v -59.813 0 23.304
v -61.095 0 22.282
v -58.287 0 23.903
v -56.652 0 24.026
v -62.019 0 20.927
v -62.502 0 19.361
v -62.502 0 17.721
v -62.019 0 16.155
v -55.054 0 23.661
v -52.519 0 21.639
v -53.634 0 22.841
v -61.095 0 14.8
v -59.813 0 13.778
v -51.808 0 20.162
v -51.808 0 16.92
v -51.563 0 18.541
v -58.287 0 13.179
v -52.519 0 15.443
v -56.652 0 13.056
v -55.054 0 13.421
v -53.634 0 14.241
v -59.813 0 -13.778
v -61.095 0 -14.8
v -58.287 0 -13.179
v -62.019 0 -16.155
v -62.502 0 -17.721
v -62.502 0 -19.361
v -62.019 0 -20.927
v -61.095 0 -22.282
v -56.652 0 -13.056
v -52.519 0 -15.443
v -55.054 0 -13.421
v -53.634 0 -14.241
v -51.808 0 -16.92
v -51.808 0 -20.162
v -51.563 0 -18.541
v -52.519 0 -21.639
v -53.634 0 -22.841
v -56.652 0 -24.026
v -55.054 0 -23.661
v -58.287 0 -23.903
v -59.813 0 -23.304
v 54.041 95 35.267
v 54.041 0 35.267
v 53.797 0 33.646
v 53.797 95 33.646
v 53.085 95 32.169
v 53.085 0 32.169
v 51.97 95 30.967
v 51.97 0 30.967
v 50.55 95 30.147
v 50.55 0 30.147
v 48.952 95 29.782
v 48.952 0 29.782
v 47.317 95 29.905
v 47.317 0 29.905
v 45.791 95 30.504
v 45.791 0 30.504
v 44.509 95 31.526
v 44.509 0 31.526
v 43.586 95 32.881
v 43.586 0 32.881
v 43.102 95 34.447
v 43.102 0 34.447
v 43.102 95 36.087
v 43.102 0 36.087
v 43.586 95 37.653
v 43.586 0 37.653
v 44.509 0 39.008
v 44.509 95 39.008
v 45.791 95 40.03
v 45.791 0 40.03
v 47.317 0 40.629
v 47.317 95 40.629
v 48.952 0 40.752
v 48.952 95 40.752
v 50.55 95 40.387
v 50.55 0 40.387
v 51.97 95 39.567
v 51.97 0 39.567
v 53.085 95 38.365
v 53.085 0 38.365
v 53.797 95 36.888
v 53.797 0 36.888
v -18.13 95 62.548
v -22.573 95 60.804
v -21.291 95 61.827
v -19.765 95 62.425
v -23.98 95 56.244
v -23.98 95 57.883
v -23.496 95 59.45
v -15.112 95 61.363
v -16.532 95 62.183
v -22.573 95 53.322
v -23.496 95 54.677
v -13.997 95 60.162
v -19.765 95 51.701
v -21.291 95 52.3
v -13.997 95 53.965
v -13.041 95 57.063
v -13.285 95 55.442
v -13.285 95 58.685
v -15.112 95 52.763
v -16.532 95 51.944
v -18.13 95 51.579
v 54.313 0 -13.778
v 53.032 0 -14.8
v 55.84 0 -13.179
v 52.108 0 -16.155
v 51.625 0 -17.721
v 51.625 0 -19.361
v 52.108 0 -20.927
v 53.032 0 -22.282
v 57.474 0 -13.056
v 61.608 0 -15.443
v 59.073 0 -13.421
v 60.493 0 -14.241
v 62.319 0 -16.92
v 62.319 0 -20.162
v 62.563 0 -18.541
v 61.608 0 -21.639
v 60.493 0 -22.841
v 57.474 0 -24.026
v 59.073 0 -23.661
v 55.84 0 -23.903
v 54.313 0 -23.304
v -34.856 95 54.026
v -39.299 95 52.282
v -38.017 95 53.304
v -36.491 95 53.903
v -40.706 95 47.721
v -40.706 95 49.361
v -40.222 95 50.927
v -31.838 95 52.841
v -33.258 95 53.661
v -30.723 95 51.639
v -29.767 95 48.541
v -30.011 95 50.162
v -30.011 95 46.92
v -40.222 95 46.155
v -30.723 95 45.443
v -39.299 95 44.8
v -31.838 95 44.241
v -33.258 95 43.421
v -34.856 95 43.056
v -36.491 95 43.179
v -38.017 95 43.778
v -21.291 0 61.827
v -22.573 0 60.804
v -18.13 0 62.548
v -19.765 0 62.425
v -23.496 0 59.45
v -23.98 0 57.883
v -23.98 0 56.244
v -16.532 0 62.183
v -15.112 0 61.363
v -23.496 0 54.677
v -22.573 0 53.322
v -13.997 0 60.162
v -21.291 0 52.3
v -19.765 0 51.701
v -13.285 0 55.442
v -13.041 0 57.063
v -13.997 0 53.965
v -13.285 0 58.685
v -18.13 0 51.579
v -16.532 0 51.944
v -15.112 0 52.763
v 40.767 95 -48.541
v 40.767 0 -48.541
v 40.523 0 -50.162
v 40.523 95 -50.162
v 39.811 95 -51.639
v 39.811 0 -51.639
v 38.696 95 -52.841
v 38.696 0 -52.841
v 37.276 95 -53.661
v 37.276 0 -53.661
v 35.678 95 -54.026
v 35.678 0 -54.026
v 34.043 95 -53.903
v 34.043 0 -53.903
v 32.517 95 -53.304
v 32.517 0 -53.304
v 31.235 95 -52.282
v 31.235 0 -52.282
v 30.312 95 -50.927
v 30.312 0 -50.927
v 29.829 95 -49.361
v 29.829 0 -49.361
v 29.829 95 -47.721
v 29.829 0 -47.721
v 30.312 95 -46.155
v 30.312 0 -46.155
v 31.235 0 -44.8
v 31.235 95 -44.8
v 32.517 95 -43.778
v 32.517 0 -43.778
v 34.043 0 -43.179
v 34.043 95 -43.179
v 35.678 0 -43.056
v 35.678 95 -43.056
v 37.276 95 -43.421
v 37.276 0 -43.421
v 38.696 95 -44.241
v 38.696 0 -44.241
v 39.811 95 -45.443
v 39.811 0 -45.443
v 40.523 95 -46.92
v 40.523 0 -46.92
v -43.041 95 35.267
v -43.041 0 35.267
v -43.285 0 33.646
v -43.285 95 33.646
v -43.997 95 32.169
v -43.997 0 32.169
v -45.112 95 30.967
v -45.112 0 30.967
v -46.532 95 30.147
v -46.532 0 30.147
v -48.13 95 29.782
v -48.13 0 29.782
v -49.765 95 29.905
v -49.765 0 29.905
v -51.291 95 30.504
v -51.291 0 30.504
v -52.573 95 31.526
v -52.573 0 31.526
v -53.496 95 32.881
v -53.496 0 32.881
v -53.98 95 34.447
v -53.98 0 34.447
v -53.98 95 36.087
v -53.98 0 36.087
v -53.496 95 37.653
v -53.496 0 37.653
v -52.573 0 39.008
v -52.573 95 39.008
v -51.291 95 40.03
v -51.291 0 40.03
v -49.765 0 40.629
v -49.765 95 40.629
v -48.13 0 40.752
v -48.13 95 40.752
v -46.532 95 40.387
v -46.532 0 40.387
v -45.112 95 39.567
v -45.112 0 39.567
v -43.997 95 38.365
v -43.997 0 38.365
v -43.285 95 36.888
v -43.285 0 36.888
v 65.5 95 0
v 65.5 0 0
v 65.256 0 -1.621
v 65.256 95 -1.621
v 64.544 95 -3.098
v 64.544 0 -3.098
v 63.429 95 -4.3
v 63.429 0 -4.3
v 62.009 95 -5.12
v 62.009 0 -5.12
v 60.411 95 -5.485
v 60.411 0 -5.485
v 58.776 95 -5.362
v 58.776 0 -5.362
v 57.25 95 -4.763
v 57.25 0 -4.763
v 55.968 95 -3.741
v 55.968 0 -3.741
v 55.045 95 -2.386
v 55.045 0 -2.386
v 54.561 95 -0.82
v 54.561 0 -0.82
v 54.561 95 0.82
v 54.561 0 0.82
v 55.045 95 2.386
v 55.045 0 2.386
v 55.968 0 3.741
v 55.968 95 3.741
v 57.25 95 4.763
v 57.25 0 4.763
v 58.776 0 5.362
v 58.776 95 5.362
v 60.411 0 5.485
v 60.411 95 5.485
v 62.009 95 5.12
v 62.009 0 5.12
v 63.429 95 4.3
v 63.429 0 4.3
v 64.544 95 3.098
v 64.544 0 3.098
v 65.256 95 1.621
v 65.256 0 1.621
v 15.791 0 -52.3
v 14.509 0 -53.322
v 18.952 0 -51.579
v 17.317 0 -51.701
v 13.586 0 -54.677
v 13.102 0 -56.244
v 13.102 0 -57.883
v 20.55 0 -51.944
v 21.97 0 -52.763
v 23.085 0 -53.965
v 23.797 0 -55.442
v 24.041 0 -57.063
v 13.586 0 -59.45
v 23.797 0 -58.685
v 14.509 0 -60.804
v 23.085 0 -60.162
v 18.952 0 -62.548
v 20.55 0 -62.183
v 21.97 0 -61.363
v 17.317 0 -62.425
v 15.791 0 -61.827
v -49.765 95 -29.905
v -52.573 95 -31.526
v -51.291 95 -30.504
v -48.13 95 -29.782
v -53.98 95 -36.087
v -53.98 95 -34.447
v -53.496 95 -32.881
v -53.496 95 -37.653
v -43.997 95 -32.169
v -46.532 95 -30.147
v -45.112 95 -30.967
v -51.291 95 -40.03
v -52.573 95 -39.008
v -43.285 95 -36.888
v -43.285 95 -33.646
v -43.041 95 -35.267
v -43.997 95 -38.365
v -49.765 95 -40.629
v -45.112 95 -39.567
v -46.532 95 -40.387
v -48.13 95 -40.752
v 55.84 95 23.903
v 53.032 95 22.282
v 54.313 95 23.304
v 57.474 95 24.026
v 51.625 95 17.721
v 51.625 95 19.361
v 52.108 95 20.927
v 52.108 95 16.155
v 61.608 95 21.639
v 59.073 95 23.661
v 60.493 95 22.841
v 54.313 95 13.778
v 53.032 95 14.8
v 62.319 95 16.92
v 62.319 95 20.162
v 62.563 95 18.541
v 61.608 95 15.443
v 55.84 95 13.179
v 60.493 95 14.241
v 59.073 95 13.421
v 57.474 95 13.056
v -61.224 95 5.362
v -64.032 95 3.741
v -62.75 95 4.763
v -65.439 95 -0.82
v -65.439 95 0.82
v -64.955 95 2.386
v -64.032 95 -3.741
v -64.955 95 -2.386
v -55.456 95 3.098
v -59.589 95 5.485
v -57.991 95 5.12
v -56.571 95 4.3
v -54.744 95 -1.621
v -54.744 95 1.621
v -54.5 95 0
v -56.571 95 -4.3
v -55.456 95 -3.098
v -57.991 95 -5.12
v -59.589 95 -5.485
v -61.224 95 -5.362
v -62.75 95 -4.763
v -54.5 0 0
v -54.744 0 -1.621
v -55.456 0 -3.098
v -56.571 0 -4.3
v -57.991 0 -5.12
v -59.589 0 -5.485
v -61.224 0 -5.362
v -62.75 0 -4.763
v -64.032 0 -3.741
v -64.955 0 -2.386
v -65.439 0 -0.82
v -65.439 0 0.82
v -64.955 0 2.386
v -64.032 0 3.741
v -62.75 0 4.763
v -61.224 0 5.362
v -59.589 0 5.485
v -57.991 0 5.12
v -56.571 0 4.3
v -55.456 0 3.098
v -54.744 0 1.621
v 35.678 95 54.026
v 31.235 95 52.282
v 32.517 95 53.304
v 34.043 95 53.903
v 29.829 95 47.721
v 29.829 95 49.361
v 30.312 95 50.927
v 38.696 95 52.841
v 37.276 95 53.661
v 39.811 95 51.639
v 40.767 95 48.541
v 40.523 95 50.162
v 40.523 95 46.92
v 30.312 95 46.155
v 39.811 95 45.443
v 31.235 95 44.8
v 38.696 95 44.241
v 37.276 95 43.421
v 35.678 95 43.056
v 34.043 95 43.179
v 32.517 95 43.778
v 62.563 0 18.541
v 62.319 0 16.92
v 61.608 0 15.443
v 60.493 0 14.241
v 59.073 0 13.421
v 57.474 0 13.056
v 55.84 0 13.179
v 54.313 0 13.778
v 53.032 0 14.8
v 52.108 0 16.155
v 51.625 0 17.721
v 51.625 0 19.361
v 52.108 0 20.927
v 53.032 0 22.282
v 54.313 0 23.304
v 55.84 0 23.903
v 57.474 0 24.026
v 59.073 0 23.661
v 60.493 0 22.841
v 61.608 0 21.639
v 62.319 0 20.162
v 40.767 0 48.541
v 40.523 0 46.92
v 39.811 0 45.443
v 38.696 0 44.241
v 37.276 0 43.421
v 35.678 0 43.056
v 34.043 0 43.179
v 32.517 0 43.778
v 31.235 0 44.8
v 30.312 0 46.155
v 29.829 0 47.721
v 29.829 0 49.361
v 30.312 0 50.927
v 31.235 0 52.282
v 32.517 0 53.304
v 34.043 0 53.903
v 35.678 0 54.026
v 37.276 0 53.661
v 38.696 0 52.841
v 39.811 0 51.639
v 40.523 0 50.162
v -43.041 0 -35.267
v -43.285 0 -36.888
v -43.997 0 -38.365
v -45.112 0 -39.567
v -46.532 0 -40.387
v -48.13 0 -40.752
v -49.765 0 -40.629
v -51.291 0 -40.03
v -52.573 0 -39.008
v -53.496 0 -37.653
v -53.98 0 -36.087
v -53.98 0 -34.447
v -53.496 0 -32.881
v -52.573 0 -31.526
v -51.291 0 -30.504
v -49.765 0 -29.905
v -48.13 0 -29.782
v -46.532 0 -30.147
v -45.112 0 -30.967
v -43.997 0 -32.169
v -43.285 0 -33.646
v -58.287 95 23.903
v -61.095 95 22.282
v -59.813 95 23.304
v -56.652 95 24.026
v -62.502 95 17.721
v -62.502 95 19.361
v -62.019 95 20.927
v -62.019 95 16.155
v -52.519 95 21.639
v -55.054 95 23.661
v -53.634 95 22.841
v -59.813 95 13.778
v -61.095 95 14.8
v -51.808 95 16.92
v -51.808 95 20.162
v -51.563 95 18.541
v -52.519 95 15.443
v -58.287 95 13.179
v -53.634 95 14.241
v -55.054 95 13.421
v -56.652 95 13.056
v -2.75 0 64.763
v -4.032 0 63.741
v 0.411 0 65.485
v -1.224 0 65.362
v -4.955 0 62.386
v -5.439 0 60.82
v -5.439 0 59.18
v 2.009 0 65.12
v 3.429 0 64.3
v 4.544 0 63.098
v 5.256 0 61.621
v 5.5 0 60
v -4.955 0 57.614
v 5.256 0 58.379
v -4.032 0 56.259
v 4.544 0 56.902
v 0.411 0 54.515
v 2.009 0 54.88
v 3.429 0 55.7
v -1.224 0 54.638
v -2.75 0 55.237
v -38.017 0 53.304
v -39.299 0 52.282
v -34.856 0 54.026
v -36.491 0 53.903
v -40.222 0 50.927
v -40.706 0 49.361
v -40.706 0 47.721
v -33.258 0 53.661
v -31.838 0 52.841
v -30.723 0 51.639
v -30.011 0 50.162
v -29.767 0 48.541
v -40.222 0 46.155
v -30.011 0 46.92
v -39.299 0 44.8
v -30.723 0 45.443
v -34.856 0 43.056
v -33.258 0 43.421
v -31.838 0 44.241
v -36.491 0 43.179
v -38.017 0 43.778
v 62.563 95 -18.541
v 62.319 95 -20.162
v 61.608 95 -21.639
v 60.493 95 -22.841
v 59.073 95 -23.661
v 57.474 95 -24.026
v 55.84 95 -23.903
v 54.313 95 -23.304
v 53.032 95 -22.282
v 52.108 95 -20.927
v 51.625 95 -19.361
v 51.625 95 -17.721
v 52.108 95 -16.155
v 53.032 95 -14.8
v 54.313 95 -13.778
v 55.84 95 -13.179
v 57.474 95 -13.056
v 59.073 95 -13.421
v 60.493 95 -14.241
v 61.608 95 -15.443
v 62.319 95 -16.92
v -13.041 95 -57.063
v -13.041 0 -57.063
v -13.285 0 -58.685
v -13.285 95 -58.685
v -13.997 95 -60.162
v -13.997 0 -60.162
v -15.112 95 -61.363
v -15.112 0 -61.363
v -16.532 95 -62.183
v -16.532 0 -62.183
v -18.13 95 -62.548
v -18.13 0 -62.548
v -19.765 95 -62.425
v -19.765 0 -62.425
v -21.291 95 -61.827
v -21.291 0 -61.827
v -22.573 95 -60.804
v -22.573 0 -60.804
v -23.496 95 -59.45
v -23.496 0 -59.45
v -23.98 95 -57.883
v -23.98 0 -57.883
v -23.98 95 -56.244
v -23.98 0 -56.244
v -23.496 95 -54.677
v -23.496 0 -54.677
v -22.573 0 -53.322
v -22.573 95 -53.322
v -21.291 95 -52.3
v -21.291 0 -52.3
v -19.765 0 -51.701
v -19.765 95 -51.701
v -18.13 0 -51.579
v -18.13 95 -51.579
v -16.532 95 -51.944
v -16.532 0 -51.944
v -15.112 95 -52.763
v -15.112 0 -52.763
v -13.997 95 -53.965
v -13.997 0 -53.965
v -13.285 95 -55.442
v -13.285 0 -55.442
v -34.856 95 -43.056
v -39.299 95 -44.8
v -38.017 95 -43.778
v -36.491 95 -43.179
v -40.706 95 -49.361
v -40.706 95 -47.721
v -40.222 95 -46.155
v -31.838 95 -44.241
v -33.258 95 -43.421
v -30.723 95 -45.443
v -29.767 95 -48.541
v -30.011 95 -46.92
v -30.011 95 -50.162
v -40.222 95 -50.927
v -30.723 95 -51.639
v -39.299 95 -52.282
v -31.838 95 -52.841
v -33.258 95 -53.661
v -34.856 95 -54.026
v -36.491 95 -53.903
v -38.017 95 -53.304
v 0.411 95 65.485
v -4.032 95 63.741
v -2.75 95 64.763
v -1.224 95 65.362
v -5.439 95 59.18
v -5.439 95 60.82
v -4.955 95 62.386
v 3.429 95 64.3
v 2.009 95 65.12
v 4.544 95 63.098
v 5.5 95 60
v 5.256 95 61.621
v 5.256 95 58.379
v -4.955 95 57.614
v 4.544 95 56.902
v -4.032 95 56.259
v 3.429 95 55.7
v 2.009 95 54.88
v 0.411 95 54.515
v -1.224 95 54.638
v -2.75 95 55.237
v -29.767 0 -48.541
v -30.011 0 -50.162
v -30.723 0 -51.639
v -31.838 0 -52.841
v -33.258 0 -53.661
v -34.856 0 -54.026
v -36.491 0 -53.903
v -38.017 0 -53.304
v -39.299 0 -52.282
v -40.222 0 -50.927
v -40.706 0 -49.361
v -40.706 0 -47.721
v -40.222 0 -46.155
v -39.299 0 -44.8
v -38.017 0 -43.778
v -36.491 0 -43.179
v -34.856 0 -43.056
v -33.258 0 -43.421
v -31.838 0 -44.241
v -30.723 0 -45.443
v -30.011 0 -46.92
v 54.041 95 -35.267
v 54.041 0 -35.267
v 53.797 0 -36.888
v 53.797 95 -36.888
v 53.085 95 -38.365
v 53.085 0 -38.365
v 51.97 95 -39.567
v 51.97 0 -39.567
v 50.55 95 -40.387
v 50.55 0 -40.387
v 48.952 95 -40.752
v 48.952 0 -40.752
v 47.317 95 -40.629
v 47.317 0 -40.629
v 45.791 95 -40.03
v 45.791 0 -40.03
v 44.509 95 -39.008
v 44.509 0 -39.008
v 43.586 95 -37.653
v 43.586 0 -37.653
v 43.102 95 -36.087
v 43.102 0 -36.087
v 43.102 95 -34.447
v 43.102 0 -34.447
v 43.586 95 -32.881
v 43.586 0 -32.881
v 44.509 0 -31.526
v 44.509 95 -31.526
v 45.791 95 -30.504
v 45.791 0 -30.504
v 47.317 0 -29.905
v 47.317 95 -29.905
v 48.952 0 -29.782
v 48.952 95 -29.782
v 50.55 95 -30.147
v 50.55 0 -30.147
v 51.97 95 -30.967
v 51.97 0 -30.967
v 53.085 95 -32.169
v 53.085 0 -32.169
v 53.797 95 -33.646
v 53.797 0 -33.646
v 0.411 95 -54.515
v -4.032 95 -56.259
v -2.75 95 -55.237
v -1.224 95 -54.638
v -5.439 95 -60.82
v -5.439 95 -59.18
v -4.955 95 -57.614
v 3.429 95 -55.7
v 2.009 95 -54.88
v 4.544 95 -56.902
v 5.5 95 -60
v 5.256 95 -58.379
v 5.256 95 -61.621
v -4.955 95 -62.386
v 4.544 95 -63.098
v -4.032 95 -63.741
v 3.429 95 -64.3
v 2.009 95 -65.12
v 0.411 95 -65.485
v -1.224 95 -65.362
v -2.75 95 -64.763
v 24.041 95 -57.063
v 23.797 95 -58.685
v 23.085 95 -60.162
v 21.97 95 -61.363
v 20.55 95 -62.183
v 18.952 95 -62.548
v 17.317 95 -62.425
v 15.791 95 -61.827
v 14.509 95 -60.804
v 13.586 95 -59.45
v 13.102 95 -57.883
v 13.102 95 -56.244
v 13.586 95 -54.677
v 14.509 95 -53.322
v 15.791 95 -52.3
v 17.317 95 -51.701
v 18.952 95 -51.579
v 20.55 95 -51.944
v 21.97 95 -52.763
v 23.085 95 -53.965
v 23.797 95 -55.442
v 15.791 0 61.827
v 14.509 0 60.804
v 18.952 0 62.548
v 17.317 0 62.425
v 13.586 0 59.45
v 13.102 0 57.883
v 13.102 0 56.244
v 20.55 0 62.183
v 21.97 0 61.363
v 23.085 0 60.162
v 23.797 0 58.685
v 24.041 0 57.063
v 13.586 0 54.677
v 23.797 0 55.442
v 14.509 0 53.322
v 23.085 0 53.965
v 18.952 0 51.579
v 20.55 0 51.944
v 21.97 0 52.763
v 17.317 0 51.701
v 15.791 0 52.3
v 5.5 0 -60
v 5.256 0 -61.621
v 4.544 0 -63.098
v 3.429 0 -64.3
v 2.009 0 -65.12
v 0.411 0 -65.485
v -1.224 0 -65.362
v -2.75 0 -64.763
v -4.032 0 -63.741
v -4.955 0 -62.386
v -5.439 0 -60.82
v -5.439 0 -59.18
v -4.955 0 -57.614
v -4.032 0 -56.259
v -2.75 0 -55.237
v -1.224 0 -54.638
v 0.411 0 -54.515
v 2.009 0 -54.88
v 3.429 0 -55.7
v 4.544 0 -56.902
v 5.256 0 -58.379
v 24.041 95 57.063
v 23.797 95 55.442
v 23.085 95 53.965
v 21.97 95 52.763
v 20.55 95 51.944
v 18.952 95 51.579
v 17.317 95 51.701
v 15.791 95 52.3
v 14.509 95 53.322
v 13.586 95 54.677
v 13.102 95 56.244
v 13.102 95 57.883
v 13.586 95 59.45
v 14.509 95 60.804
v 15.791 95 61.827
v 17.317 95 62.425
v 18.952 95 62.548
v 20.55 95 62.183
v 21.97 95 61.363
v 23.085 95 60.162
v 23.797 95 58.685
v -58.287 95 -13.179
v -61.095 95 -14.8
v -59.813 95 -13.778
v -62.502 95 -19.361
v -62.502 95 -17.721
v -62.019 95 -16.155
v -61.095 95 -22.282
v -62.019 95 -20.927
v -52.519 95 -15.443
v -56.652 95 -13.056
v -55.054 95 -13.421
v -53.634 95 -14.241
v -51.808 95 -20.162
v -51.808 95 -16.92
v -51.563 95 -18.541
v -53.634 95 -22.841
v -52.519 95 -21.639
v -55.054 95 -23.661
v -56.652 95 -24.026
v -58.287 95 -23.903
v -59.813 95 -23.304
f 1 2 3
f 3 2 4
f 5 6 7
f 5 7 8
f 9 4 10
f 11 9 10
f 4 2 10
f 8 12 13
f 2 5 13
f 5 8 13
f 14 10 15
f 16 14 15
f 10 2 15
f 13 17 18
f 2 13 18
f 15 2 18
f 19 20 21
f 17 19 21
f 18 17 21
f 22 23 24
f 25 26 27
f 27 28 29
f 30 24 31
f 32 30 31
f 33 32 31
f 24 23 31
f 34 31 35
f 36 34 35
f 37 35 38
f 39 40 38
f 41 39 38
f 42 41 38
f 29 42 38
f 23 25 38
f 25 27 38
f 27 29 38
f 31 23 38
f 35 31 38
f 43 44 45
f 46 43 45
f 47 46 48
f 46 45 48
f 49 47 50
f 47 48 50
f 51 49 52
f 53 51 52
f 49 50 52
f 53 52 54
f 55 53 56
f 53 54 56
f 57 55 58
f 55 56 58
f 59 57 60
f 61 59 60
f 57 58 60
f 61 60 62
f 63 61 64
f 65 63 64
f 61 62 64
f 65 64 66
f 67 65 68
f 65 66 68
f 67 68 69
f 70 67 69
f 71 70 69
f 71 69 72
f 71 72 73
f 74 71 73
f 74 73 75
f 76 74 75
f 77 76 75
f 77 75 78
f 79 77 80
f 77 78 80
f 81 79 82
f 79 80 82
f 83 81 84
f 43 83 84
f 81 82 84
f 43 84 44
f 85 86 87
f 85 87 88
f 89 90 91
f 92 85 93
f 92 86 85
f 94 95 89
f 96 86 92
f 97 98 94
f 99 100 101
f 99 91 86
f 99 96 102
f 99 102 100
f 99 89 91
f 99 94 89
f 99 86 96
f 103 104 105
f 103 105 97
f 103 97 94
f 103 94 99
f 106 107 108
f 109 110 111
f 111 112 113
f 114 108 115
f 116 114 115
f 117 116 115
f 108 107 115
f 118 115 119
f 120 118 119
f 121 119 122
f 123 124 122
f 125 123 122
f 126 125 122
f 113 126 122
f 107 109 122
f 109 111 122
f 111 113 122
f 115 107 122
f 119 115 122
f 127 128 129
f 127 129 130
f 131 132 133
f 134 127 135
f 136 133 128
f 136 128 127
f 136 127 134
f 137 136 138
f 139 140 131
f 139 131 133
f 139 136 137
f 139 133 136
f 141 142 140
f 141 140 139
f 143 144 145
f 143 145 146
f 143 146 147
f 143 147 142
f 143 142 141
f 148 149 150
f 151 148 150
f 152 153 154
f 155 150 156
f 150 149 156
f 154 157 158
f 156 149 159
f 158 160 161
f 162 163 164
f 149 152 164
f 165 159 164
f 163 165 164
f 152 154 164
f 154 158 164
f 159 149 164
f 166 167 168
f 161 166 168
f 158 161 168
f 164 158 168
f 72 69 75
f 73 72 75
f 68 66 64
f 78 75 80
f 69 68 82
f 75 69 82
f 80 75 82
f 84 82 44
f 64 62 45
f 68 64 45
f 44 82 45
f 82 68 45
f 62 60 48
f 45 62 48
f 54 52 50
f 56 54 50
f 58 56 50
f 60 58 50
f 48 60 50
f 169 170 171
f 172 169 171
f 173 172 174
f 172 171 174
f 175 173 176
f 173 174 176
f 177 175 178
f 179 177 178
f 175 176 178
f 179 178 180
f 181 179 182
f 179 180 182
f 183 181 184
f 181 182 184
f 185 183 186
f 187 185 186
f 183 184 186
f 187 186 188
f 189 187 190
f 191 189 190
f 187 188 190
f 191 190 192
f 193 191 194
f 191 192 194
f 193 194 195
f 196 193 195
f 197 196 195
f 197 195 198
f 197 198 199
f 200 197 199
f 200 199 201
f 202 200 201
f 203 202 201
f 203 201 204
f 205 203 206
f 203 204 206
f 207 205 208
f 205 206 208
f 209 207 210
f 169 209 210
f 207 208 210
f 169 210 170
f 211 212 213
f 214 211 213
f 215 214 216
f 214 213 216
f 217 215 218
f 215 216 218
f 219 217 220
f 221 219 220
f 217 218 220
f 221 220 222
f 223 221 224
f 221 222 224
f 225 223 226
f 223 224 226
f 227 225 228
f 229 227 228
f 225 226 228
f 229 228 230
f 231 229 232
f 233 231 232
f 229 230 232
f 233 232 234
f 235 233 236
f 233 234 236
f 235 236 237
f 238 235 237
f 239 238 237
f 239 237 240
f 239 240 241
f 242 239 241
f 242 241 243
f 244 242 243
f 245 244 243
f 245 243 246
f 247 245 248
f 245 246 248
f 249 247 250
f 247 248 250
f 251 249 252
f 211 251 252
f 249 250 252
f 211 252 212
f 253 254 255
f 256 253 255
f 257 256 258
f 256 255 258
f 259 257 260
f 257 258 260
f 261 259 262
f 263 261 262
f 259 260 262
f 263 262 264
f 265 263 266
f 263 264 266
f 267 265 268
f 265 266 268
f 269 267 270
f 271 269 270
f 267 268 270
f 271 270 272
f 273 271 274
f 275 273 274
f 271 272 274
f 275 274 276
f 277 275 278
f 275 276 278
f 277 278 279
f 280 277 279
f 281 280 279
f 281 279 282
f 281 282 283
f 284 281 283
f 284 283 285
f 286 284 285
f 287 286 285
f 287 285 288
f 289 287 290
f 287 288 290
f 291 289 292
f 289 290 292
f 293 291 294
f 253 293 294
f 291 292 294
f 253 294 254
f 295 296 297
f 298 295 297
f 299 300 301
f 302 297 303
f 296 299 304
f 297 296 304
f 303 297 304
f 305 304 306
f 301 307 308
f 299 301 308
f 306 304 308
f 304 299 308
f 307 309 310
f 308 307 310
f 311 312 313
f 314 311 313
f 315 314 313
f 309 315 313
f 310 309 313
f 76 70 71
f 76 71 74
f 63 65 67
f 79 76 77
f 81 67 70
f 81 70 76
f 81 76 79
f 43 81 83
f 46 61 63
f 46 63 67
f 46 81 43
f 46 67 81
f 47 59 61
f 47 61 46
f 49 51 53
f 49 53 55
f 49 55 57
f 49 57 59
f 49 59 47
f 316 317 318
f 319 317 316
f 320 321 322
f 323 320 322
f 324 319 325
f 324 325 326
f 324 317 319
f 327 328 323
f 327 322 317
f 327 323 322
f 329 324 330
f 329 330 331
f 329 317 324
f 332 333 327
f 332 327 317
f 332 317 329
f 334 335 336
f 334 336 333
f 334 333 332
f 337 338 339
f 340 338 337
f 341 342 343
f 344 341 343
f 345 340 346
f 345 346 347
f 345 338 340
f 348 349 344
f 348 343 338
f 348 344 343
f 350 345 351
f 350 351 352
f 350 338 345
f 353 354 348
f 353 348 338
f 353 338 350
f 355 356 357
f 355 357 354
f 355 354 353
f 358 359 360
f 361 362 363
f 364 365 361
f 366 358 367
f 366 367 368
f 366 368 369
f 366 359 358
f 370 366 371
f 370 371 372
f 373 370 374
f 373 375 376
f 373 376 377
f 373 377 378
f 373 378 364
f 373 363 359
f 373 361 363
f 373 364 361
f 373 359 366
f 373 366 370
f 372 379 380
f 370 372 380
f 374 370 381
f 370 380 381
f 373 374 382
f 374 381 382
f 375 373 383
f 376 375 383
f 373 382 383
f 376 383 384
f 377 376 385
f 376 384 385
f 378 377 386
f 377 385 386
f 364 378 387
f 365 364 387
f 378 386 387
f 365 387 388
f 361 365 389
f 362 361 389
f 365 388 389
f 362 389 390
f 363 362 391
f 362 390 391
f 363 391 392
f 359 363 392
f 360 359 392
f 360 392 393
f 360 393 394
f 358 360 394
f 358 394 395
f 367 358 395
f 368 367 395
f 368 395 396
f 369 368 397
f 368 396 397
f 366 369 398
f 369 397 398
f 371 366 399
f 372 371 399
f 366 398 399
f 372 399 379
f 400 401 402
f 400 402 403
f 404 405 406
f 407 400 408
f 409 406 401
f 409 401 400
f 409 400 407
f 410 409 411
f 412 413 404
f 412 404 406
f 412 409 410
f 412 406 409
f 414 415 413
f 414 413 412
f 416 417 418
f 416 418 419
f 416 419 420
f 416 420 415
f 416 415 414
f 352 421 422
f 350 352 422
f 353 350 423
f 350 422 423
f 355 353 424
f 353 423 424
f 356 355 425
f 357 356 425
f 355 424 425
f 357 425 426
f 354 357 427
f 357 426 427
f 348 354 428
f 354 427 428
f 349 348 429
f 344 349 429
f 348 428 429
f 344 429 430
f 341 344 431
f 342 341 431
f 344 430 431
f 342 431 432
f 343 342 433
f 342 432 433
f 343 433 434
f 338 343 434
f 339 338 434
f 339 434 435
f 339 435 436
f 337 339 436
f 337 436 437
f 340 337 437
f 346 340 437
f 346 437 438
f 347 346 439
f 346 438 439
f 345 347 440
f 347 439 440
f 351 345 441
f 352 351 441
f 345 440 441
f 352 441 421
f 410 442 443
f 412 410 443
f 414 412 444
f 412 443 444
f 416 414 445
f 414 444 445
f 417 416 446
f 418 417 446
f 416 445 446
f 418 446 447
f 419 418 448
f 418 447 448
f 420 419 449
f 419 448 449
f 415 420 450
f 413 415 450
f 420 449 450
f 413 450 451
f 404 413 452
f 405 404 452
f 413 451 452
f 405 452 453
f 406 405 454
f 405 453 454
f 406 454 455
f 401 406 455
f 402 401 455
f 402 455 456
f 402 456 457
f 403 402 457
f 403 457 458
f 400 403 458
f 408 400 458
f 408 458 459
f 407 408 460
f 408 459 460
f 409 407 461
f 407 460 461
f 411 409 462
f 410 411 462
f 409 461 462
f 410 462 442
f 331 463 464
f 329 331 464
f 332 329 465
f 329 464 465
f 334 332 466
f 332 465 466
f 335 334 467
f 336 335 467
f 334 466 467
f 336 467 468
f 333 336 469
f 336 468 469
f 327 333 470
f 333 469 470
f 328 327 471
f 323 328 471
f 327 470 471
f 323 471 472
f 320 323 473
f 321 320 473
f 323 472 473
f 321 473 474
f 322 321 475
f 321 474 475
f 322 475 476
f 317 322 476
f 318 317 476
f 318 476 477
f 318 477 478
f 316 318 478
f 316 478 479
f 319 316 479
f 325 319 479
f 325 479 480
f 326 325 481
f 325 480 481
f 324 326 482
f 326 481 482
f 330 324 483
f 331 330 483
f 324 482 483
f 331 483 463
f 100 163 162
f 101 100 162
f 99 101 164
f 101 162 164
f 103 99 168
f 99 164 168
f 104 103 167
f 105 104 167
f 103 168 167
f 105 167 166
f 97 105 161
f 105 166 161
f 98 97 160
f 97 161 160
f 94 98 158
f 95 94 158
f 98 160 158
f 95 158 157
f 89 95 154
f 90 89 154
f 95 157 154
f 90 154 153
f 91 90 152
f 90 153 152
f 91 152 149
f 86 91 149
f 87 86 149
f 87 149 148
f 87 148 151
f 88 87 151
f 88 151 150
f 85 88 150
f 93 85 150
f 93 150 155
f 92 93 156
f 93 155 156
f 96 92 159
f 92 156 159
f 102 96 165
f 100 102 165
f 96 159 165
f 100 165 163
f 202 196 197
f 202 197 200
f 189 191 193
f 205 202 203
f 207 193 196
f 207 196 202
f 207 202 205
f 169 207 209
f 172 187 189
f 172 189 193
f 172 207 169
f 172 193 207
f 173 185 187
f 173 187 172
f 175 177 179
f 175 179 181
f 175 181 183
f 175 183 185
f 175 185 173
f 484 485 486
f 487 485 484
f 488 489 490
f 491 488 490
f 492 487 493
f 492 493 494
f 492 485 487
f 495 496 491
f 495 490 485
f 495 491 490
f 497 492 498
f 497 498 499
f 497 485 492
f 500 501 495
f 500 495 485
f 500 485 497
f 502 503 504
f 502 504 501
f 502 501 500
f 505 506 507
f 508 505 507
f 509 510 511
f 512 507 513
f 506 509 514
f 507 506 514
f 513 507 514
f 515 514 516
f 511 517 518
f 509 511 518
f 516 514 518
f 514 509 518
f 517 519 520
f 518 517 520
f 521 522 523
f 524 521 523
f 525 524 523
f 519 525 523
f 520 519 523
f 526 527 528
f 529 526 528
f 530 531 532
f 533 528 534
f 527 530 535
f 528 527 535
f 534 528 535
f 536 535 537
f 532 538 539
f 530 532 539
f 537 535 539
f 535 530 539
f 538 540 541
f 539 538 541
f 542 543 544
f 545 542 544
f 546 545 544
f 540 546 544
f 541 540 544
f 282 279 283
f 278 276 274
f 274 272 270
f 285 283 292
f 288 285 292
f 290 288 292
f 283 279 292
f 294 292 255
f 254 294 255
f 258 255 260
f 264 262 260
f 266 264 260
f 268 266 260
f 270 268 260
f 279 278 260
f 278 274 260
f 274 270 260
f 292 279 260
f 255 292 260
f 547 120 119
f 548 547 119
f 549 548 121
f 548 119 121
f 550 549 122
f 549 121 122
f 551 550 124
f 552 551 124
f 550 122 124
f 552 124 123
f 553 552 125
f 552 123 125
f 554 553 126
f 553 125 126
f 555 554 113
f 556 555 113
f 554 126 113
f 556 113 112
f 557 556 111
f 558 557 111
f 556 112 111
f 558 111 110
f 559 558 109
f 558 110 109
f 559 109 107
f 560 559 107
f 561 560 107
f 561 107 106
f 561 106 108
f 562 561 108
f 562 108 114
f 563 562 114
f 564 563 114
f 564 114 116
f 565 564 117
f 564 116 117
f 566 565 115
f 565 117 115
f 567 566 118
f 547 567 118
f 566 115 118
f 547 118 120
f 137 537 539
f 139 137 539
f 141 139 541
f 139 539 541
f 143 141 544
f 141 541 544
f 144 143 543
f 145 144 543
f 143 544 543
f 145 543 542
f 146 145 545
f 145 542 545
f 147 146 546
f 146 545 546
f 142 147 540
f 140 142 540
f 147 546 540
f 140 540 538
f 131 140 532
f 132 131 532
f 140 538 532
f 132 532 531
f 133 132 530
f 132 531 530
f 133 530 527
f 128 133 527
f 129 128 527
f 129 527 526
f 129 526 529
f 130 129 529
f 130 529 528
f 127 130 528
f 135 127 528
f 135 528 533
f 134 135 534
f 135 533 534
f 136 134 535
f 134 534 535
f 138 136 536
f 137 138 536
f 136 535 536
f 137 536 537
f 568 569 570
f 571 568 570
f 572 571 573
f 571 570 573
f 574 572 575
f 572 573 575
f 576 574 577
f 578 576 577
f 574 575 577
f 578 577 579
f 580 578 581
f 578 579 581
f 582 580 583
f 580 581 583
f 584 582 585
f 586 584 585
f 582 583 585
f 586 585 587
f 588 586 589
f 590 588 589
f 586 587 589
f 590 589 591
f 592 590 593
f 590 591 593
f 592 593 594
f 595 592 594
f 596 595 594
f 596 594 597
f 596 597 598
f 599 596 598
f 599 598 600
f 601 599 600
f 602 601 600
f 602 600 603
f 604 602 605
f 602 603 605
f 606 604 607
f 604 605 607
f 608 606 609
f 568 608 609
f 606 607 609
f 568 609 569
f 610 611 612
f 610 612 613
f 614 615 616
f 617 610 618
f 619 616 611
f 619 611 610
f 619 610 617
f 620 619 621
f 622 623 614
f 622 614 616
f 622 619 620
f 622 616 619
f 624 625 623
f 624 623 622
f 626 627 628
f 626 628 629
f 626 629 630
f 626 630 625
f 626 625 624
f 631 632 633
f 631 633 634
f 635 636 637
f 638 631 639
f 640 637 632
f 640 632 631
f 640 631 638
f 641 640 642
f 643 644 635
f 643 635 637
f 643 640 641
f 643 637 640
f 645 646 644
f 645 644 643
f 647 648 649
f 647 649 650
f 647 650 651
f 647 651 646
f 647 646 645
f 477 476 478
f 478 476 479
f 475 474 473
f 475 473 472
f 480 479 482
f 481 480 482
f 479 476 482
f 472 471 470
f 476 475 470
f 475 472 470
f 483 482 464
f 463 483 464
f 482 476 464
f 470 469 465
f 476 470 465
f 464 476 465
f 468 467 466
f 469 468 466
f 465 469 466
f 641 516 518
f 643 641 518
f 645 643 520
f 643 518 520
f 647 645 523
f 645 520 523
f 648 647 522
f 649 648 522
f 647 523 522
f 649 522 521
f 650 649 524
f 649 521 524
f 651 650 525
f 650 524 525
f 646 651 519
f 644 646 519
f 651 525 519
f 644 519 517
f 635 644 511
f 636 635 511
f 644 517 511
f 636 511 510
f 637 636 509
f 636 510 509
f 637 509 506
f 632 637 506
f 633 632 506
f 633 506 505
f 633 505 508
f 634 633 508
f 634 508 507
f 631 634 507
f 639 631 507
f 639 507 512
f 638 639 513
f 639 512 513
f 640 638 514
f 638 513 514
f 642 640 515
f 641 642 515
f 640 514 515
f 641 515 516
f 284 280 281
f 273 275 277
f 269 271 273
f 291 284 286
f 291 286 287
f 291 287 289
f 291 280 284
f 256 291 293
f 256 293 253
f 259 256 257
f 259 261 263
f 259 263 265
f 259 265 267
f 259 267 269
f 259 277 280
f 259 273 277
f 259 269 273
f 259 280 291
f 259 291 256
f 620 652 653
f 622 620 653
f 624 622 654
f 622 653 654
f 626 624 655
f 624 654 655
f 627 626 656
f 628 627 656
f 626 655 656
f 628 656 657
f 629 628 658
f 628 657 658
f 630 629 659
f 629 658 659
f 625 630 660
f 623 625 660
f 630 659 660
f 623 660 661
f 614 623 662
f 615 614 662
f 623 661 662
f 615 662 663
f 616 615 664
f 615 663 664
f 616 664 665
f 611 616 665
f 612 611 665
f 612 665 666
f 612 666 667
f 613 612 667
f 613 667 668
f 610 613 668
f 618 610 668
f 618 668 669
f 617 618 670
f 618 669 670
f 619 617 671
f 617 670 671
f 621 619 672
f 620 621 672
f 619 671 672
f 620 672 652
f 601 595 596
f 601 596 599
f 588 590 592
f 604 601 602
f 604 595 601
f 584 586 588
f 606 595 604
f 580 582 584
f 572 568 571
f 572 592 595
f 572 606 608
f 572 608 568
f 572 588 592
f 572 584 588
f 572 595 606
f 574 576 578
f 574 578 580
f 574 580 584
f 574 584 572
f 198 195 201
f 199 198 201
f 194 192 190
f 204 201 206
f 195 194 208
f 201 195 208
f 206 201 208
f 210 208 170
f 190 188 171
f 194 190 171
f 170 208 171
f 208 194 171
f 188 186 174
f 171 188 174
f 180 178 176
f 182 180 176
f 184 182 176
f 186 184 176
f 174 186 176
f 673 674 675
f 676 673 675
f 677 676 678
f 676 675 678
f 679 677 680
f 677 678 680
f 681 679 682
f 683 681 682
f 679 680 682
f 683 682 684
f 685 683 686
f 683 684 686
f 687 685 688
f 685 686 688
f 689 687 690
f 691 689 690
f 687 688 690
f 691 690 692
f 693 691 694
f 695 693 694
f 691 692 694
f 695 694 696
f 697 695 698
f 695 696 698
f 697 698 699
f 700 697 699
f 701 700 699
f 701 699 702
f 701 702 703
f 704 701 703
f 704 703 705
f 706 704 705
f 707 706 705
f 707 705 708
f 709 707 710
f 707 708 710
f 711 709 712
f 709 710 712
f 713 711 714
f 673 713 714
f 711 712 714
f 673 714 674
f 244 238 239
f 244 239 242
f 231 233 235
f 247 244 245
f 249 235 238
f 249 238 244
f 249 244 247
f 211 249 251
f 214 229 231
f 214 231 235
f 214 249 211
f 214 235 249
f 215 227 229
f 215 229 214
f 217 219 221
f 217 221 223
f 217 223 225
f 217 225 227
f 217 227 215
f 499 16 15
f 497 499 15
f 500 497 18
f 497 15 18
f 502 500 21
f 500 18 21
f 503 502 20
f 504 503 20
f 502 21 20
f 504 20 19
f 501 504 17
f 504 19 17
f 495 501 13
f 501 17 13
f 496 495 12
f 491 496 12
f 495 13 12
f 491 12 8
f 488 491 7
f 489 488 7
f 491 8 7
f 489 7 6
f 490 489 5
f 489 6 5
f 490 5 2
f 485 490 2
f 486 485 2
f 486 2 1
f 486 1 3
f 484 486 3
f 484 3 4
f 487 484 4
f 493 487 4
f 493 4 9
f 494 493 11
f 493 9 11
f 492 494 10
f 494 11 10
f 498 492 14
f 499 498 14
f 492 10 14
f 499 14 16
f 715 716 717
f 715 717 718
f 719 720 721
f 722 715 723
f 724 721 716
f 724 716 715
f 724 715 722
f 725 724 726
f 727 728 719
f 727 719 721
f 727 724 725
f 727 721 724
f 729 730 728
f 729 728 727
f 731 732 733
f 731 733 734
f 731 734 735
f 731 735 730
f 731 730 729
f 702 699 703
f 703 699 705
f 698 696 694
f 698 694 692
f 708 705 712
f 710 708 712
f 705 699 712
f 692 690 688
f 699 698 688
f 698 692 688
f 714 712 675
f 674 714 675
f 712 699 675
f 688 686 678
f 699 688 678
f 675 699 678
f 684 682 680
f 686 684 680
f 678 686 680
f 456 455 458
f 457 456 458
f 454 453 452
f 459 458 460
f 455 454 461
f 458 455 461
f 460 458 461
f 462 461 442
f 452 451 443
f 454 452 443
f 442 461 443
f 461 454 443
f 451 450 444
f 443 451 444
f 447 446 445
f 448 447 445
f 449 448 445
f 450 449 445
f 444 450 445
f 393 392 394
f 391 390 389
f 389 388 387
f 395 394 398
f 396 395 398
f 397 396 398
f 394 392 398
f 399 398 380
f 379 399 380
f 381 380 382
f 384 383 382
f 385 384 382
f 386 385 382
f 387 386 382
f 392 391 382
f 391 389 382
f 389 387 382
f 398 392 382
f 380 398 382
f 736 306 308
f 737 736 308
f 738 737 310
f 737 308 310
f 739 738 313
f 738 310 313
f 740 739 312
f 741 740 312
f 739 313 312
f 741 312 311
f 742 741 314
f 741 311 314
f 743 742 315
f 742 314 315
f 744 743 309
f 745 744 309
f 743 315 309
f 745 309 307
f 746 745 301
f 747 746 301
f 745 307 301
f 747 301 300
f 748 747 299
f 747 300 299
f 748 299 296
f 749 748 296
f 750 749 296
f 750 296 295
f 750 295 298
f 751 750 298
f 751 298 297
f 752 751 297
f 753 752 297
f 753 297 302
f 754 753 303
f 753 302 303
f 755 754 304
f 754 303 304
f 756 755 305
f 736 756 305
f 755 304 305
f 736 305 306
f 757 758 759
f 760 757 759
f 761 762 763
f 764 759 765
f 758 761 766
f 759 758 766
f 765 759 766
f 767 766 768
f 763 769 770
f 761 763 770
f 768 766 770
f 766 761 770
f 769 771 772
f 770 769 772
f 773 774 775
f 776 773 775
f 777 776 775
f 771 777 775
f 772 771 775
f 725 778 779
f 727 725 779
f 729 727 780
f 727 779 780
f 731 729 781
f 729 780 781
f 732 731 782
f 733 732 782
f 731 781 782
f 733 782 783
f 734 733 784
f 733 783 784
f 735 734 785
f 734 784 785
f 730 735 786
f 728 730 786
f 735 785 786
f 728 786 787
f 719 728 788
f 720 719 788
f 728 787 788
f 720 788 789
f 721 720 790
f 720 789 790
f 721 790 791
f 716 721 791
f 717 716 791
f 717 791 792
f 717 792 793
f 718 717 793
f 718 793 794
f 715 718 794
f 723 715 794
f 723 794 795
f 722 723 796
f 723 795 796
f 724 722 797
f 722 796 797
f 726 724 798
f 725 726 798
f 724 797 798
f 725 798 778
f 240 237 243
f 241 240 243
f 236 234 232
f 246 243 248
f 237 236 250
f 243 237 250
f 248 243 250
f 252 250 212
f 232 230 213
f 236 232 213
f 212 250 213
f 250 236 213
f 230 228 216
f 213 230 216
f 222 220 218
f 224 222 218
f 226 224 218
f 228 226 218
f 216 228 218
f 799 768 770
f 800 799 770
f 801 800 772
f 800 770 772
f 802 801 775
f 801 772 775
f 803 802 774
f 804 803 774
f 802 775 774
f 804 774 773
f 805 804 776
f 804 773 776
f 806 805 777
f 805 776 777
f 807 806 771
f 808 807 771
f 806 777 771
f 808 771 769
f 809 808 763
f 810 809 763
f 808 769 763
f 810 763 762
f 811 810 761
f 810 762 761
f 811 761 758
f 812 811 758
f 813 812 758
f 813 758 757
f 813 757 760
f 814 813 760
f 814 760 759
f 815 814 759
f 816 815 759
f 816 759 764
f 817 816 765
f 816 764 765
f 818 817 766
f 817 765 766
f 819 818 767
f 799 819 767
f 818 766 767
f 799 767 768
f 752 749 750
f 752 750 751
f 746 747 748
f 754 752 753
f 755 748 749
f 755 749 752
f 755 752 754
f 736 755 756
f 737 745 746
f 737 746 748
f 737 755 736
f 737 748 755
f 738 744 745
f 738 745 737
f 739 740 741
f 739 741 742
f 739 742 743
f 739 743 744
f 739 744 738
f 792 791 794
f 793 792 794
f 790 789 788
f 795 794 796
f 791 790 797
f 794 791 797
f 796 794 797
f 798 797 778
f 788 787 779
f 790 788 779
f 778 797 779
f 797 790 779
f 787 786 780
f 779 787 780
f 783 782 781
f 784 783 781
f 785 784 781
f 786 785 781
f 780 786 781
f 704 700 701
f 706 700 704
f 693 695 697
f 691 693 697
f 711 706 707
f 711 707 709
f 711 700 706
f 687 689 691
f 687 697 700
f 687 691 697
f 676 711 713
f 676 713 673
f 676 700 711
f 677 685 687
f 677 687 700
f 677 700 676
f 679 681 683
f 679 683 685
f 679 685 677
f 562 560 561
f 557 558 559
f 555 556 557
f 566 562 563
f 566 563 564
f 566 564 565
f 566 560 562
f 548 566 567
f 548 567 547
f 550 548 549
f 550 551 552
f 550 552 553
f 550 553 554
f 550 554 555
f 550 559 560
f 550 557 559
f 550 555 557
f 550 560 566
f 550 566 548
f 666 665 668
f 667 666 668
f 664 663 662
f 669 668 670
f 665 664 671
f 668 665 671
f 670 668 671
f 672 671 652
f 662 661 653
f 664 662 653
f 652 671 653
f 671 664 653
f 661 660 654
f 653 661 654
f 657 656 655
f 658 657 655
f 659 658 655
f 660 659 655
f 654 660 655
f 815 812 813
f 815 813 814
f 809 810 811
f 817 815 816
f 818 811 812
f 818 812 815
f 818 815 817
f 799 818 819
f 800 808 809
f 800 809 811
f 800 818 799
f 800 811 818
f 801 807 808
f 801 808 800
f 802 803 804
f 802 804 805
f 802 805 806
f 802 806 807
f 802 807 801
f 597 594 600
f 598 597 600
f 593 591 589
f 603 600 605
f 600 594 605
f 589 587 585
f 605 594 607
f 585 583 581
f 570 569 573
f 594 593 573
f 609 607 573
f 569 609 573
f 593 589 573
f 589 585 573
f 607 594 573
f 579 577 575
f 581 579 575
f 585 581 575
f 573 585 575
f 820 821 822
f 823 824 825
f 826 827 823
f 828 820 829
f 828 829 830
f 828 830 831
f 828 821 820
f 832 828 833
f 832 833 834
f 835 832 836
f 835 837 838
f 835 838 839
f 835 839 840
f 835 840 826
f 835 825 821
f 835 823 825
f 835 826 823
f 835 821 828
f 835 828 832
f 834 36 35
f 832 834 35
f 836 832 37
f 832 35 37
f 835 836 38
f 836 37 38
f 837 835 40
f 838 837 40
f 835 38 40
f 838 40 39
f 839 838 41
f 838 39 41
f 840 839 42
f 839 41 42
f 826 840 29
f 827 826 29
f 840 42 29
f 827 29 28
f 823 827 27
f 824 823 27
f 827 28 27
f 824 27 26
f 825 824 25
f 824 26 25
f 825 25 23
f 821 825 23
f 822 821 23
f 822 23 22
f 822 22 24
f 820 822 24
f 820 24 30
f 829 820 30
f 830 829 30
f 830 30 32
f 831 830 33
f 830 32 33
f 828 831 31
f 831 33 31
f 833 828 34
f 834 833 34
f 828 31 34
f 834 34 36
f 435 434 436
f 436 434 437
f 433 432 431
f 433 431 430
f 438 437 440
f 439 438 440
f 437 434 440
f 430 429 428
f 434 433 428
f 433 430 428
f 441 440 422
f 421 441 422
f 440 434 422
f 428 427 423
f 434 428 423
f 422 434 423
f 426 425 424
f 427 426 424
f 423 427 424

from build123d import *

# Parameters (mm, degrees)
SKETCH1_R              = 5.5
BOSS_EXTRUDE1_DEPTH    = 95
BOSS_EXTRUDE1_2_DEPTH  = 95
BOSS_EXTRUDE1_3_DEPTH  = 95
BOSS_EXTRUDE1_4_DEPTH  = 95
BOSS_EXTRUDE1_5_DEPTH  = 95
BOSS_EXTRUDE1_6_DEPTH  = 95
BOSS_EXTRUDE1_7_DEPTH  = 95
BOSS_EXTRUDE1_8_DEPTH  = 95
BOSS_EXTRUDE1_9_DEPTH  = 95
BOSS_EXTRUDE1_10_DEPTH = 95
BOSS_EXTRUDE1_11_DEPTH = 95
BOSS_EXTRUDE1_12_DEPTH = 95
BOSS_EXTRUDE1_13_DEPTH = 95
BOSS_EXTRUDE1_14_DEPTH = 95
BOSS_EXTRUDE1_15_DEPTH = 95
BOSS_EXTRUDE1_16_DEPTH = 95
BOSS_EXTRUDE1_17_DEPTH = 95
BOSS_EXTRUDE1_18_DEPTH = 95
BOSS_EXTRUDE1_19_DEPTH = 95
BOSS_EXTRUDE1_20_DEPTH = 95


with BuildPart() as part:
    # Sketch1 → Boss-Extrude1 (new body)
    with BuildSketch(Plane(origin=(0, 0, 0), x_dir=(1, 0, 0), z_dir=(0, 1, 0))):
        with Locations((-60, 0)):
            Circle(SKETCH1_R)
    extrude(amount=BOSS_EXTRUDE1_DEPTH)


with BuildPart() as body_2:
    # Sketch1 → Boss-Extrude1 2 (new body)
    with BuildSketch(Plane(origin=(0, 0, 0), x_dir=(1, 0, 0), z_dir=(0, 1, 0))):
        with Locations((-57.063390978, 18.541019662)):
            Circle(SKETCH1_R)
    extrude(amount=BOSS_EXTRUDE1_2_DEPTH)


with BuildPart() as body_3:
    # Sketch1 → Boss-Extrude1 3 (new body)
    with BuildSketch(Plane(origin=(0, 0, 0), x_dir=(1, 0, 0), z_dir=(0, 1, 0))):
        with Locations((-48.541019662, 35.267115138)):
            Circle(SKETCH1_R)
    extrude(amount=BOSS_EXTRUDE1_3_DEPTH)


with BuildPart() as body_4:
    # Sketch1 → Boss-Extrude1 4 (new body)
    with BuildSketch(Plane(origin=(0, 0, 0), x_dir=(1, 0, 0), z_dir=(0, 1, 0))):
        with Locations((-35.267115138, 48.541019662)):
            Circle(SKETCH1_R)
    extrude(amount=BOSS_EXTRUDE1_4_DEPTH)


with BuildPart() as body_5:
    # Sketch1 → Boss-Extrude1 5 (new body)
    with BuildSketch(Plane(origin=(0, 0, 0), x_dir=(1, 0, 0), z_dir=(0, 1, 0))):
        with Locations((-18.541019662, 57.063390978)):
            Circle(SKETCH1_R)
    extrude(amount=BOSS_EXTRUDE1_5_DEPTH)


with BuildPart() as body_6:
    # Sketch1 → Boss-Extrude1 6 (new body)
    with BuildSketch(Plane(origin=(0, 0, 0), x_dir=(1, 0, 0), z_dir=(0, 1, 0))):
        with Locations((0, 60)):
            Circle(SKETCH1_R)
    extrude(amount=BOSS_EXTRUDE1_6_DEPTH)


with BuildPart() as body_7:
    # Sketch1 → Boss-Extrude1 7 (new body)
    with BuildSketch(Plane(origin=(0, 0, 0), x_dir=(1, 0, 0), z_dir=(0, 1, 0))):
        with Locations((18.541019662, 57.063390978)):
            Circle(SKETCH1_R)
    extrude(amount=BOSS_EXTRUDE1_7_DEPTH)


with BuildPart() as body_8:
    # Sketch1 → Boss-Extrude1 8 (new body)
    with BuildSketch(Plane(origin=(0, 0, 0), x_dir=(1, 0, 0), z_dir=(0, 1, 0))):
        with Locations((35.267115138, 48.541019662)):
            Circle(SKETCH1_R)
    extrude(amount=BOSS_EXTRUDE1_8_DEPTH)


with BuildPart() as body_9:
    # Sketch1 → Boss-Extrude1 9 (new body)
    with BuildSketch(Plane(origin=(0, 0, 0), x_dir=(1, 0, 0), z_dir=(0, 1, 0))):
        with Locations((48.541019662, 35.267115138)):
            Circle(SKETCH1_R)
    extrude(amount=BOSS_EXTRUDE1_9_DEPTH)


with BuildPart() as body_10:
    # Sketch1 → Boss-Extrude1 10 (new body)
    with BuildSketch(Plane(origin=(0, 0, 0), x_dir=(1, 0, 0), z_dir=(0, 1, 0))):
        with Locations((57.063390978, 18.541019662)):
            Circle(SKETCH1_R)
    extrude(amount=BOSS_EXTRUDE1_10_DEPTH)


with BuildPart() as body_11:
    # Sketch1 → Boss-Extrude1 11 (new body)
    with BuildSketch(Plane(origin=(0, 0, 0), x_dir=(1, 0, 0), z_dir=(0, 1, 0))):
        with Locations((60, 0)):
            Circle(SKETCH1_R)
    extrude(amount=BOSS_EXTRUDE1_11_DEPTH)


with BuildPart() as body_12:
    # Sketch1 → Boss-Extrude1 12 (new body)
    with BuildSketch(Plane(origin=(0, 0, 0), x_dir=(1, 0, 0), z_dir=(0, 1, 0))):
        with Locations((57.063390978, -18.541019662)):
            Circle(SKETCH1_R)
    extrude(amount=BOSS_EXTRUDE1_12_DEPTH)


with BuildPart() as body_13:
    # Sketch1 → Boss-Extrude1 13 (new body)
    with BuildSketch(Plane(origin=(0, 0, 0), x_dir=(1, 0, 0), z_dir=(0, 1, 0))):
        with Locations((48.541019662, -35.267115138)):
            Circle(SKETCH1_R)
    extrude(amount=BOSS_EXTRUDE1_13_DEPTH)


with BuildPart() as body_14:
    # Sketch1 → Boss-Extrude1 14 (new body)
    with BuildSketch(Plane(origin=(0, 0, 0), x_dir=(1, 0, 0), z_dir=(0, 1, 0))):
        with Locations((35.267115138, -48.541019662)):
            Circle(SKETCH1_R)
    extrude(amount=BOSS_EXTRUDE1_14_DEPTH)


with BuildPart() as body_15:
    # Sketch1 → Boss-Extrude1 15 (new body)
    with BuildSketch(Plane(origin=(0, 0, 0), x_dir=(1, 0, 0), z_dir=(0, 1, 0))):
        with Locations((18.541019662, -57.063390978)):
            Circle(SKETCH1_R)
    extrude(amount=BOSS_EXTRUDE1_15_DEPTH)


with BuildPart() as body_16:
    # Sketch1 → Boss-Extrude1 16 (new body)
    with BuildSketch(Plane(origin=(0, 0, 0), x_dir=(1, 0, 0), z_dir=(0, 1, 0))):
        with Locations((0, -60)):
            Circle(SKETCH1_R)
    extrude(amount=BOSS_EXTRUDE1_16_DEPTH)


with BuildPart() as body_17:
    # Sketch1 → Boss-Extrude1 17 (new body)
    with BuildSketch(Plane(origin=(0, 0, 0), x_dir=(1, 0, 0), z_dir=(0, 1, 0))):
        with Locations((-18.541019662, -57.063390978)):
            Circle(SKETCH1_R)
    extrude(amount=BOSS_EXTRUDE1_17_DEPTH)


with BuildPart() as body_18:
    # Sketch1 → Boss-Extrude1 18 (new body)
    with BuildSketch(Plane(origin=(0, 0, 0), x_dir=(1, 0, 0), z_dir=(0, 1, 0))):
        with Locations((-35.267115138, -48.541019662)):
            Circle(SKETCH1_R)
    extrude(amount=BOSS_EXTRUDE1_18_DEPTH)


with BuildPart() as body_19:
    # Sketch1 → Boss-Extrude1 19 (new body)
    with BuildSketch(Plane(origin=(0, 0, 0), x_dir=(1, 0, 0), z_dir=(0, 1, 0))):
        with Locations((-48.541019662, -35.267115138)):
            Circle(SKETCH1_R)
    extrude(amount=BOSS_EXTRUDE1_19_DEPTH)


with BuildPart() as body_20:
    # Sketch1 → Boss-Extrude1 20 (new body)
    with BuildSketch(Plane(origin=(0, 0, 0), x_dir=(1, 0, 0), z_dir=(0, 1, 0))):
        with Locations((-57.063390978, -18.541019662)):
            Circle(SKETCH1_R)
    extrude(amount=BOSS_EXTRUDE1_20_DEPTH)


solid = Compound([part.part, body_2.part, body_3.part, body_4.part, body_5.part, body_6.part, body_7.part, body_8.part, body_9.part, body_10.part, body_11.part, body_12.part, body_13.part, body_14.part, body_15.part, body_16.part, body_17.part, body_18.part, body_19.part, body_20.part])
